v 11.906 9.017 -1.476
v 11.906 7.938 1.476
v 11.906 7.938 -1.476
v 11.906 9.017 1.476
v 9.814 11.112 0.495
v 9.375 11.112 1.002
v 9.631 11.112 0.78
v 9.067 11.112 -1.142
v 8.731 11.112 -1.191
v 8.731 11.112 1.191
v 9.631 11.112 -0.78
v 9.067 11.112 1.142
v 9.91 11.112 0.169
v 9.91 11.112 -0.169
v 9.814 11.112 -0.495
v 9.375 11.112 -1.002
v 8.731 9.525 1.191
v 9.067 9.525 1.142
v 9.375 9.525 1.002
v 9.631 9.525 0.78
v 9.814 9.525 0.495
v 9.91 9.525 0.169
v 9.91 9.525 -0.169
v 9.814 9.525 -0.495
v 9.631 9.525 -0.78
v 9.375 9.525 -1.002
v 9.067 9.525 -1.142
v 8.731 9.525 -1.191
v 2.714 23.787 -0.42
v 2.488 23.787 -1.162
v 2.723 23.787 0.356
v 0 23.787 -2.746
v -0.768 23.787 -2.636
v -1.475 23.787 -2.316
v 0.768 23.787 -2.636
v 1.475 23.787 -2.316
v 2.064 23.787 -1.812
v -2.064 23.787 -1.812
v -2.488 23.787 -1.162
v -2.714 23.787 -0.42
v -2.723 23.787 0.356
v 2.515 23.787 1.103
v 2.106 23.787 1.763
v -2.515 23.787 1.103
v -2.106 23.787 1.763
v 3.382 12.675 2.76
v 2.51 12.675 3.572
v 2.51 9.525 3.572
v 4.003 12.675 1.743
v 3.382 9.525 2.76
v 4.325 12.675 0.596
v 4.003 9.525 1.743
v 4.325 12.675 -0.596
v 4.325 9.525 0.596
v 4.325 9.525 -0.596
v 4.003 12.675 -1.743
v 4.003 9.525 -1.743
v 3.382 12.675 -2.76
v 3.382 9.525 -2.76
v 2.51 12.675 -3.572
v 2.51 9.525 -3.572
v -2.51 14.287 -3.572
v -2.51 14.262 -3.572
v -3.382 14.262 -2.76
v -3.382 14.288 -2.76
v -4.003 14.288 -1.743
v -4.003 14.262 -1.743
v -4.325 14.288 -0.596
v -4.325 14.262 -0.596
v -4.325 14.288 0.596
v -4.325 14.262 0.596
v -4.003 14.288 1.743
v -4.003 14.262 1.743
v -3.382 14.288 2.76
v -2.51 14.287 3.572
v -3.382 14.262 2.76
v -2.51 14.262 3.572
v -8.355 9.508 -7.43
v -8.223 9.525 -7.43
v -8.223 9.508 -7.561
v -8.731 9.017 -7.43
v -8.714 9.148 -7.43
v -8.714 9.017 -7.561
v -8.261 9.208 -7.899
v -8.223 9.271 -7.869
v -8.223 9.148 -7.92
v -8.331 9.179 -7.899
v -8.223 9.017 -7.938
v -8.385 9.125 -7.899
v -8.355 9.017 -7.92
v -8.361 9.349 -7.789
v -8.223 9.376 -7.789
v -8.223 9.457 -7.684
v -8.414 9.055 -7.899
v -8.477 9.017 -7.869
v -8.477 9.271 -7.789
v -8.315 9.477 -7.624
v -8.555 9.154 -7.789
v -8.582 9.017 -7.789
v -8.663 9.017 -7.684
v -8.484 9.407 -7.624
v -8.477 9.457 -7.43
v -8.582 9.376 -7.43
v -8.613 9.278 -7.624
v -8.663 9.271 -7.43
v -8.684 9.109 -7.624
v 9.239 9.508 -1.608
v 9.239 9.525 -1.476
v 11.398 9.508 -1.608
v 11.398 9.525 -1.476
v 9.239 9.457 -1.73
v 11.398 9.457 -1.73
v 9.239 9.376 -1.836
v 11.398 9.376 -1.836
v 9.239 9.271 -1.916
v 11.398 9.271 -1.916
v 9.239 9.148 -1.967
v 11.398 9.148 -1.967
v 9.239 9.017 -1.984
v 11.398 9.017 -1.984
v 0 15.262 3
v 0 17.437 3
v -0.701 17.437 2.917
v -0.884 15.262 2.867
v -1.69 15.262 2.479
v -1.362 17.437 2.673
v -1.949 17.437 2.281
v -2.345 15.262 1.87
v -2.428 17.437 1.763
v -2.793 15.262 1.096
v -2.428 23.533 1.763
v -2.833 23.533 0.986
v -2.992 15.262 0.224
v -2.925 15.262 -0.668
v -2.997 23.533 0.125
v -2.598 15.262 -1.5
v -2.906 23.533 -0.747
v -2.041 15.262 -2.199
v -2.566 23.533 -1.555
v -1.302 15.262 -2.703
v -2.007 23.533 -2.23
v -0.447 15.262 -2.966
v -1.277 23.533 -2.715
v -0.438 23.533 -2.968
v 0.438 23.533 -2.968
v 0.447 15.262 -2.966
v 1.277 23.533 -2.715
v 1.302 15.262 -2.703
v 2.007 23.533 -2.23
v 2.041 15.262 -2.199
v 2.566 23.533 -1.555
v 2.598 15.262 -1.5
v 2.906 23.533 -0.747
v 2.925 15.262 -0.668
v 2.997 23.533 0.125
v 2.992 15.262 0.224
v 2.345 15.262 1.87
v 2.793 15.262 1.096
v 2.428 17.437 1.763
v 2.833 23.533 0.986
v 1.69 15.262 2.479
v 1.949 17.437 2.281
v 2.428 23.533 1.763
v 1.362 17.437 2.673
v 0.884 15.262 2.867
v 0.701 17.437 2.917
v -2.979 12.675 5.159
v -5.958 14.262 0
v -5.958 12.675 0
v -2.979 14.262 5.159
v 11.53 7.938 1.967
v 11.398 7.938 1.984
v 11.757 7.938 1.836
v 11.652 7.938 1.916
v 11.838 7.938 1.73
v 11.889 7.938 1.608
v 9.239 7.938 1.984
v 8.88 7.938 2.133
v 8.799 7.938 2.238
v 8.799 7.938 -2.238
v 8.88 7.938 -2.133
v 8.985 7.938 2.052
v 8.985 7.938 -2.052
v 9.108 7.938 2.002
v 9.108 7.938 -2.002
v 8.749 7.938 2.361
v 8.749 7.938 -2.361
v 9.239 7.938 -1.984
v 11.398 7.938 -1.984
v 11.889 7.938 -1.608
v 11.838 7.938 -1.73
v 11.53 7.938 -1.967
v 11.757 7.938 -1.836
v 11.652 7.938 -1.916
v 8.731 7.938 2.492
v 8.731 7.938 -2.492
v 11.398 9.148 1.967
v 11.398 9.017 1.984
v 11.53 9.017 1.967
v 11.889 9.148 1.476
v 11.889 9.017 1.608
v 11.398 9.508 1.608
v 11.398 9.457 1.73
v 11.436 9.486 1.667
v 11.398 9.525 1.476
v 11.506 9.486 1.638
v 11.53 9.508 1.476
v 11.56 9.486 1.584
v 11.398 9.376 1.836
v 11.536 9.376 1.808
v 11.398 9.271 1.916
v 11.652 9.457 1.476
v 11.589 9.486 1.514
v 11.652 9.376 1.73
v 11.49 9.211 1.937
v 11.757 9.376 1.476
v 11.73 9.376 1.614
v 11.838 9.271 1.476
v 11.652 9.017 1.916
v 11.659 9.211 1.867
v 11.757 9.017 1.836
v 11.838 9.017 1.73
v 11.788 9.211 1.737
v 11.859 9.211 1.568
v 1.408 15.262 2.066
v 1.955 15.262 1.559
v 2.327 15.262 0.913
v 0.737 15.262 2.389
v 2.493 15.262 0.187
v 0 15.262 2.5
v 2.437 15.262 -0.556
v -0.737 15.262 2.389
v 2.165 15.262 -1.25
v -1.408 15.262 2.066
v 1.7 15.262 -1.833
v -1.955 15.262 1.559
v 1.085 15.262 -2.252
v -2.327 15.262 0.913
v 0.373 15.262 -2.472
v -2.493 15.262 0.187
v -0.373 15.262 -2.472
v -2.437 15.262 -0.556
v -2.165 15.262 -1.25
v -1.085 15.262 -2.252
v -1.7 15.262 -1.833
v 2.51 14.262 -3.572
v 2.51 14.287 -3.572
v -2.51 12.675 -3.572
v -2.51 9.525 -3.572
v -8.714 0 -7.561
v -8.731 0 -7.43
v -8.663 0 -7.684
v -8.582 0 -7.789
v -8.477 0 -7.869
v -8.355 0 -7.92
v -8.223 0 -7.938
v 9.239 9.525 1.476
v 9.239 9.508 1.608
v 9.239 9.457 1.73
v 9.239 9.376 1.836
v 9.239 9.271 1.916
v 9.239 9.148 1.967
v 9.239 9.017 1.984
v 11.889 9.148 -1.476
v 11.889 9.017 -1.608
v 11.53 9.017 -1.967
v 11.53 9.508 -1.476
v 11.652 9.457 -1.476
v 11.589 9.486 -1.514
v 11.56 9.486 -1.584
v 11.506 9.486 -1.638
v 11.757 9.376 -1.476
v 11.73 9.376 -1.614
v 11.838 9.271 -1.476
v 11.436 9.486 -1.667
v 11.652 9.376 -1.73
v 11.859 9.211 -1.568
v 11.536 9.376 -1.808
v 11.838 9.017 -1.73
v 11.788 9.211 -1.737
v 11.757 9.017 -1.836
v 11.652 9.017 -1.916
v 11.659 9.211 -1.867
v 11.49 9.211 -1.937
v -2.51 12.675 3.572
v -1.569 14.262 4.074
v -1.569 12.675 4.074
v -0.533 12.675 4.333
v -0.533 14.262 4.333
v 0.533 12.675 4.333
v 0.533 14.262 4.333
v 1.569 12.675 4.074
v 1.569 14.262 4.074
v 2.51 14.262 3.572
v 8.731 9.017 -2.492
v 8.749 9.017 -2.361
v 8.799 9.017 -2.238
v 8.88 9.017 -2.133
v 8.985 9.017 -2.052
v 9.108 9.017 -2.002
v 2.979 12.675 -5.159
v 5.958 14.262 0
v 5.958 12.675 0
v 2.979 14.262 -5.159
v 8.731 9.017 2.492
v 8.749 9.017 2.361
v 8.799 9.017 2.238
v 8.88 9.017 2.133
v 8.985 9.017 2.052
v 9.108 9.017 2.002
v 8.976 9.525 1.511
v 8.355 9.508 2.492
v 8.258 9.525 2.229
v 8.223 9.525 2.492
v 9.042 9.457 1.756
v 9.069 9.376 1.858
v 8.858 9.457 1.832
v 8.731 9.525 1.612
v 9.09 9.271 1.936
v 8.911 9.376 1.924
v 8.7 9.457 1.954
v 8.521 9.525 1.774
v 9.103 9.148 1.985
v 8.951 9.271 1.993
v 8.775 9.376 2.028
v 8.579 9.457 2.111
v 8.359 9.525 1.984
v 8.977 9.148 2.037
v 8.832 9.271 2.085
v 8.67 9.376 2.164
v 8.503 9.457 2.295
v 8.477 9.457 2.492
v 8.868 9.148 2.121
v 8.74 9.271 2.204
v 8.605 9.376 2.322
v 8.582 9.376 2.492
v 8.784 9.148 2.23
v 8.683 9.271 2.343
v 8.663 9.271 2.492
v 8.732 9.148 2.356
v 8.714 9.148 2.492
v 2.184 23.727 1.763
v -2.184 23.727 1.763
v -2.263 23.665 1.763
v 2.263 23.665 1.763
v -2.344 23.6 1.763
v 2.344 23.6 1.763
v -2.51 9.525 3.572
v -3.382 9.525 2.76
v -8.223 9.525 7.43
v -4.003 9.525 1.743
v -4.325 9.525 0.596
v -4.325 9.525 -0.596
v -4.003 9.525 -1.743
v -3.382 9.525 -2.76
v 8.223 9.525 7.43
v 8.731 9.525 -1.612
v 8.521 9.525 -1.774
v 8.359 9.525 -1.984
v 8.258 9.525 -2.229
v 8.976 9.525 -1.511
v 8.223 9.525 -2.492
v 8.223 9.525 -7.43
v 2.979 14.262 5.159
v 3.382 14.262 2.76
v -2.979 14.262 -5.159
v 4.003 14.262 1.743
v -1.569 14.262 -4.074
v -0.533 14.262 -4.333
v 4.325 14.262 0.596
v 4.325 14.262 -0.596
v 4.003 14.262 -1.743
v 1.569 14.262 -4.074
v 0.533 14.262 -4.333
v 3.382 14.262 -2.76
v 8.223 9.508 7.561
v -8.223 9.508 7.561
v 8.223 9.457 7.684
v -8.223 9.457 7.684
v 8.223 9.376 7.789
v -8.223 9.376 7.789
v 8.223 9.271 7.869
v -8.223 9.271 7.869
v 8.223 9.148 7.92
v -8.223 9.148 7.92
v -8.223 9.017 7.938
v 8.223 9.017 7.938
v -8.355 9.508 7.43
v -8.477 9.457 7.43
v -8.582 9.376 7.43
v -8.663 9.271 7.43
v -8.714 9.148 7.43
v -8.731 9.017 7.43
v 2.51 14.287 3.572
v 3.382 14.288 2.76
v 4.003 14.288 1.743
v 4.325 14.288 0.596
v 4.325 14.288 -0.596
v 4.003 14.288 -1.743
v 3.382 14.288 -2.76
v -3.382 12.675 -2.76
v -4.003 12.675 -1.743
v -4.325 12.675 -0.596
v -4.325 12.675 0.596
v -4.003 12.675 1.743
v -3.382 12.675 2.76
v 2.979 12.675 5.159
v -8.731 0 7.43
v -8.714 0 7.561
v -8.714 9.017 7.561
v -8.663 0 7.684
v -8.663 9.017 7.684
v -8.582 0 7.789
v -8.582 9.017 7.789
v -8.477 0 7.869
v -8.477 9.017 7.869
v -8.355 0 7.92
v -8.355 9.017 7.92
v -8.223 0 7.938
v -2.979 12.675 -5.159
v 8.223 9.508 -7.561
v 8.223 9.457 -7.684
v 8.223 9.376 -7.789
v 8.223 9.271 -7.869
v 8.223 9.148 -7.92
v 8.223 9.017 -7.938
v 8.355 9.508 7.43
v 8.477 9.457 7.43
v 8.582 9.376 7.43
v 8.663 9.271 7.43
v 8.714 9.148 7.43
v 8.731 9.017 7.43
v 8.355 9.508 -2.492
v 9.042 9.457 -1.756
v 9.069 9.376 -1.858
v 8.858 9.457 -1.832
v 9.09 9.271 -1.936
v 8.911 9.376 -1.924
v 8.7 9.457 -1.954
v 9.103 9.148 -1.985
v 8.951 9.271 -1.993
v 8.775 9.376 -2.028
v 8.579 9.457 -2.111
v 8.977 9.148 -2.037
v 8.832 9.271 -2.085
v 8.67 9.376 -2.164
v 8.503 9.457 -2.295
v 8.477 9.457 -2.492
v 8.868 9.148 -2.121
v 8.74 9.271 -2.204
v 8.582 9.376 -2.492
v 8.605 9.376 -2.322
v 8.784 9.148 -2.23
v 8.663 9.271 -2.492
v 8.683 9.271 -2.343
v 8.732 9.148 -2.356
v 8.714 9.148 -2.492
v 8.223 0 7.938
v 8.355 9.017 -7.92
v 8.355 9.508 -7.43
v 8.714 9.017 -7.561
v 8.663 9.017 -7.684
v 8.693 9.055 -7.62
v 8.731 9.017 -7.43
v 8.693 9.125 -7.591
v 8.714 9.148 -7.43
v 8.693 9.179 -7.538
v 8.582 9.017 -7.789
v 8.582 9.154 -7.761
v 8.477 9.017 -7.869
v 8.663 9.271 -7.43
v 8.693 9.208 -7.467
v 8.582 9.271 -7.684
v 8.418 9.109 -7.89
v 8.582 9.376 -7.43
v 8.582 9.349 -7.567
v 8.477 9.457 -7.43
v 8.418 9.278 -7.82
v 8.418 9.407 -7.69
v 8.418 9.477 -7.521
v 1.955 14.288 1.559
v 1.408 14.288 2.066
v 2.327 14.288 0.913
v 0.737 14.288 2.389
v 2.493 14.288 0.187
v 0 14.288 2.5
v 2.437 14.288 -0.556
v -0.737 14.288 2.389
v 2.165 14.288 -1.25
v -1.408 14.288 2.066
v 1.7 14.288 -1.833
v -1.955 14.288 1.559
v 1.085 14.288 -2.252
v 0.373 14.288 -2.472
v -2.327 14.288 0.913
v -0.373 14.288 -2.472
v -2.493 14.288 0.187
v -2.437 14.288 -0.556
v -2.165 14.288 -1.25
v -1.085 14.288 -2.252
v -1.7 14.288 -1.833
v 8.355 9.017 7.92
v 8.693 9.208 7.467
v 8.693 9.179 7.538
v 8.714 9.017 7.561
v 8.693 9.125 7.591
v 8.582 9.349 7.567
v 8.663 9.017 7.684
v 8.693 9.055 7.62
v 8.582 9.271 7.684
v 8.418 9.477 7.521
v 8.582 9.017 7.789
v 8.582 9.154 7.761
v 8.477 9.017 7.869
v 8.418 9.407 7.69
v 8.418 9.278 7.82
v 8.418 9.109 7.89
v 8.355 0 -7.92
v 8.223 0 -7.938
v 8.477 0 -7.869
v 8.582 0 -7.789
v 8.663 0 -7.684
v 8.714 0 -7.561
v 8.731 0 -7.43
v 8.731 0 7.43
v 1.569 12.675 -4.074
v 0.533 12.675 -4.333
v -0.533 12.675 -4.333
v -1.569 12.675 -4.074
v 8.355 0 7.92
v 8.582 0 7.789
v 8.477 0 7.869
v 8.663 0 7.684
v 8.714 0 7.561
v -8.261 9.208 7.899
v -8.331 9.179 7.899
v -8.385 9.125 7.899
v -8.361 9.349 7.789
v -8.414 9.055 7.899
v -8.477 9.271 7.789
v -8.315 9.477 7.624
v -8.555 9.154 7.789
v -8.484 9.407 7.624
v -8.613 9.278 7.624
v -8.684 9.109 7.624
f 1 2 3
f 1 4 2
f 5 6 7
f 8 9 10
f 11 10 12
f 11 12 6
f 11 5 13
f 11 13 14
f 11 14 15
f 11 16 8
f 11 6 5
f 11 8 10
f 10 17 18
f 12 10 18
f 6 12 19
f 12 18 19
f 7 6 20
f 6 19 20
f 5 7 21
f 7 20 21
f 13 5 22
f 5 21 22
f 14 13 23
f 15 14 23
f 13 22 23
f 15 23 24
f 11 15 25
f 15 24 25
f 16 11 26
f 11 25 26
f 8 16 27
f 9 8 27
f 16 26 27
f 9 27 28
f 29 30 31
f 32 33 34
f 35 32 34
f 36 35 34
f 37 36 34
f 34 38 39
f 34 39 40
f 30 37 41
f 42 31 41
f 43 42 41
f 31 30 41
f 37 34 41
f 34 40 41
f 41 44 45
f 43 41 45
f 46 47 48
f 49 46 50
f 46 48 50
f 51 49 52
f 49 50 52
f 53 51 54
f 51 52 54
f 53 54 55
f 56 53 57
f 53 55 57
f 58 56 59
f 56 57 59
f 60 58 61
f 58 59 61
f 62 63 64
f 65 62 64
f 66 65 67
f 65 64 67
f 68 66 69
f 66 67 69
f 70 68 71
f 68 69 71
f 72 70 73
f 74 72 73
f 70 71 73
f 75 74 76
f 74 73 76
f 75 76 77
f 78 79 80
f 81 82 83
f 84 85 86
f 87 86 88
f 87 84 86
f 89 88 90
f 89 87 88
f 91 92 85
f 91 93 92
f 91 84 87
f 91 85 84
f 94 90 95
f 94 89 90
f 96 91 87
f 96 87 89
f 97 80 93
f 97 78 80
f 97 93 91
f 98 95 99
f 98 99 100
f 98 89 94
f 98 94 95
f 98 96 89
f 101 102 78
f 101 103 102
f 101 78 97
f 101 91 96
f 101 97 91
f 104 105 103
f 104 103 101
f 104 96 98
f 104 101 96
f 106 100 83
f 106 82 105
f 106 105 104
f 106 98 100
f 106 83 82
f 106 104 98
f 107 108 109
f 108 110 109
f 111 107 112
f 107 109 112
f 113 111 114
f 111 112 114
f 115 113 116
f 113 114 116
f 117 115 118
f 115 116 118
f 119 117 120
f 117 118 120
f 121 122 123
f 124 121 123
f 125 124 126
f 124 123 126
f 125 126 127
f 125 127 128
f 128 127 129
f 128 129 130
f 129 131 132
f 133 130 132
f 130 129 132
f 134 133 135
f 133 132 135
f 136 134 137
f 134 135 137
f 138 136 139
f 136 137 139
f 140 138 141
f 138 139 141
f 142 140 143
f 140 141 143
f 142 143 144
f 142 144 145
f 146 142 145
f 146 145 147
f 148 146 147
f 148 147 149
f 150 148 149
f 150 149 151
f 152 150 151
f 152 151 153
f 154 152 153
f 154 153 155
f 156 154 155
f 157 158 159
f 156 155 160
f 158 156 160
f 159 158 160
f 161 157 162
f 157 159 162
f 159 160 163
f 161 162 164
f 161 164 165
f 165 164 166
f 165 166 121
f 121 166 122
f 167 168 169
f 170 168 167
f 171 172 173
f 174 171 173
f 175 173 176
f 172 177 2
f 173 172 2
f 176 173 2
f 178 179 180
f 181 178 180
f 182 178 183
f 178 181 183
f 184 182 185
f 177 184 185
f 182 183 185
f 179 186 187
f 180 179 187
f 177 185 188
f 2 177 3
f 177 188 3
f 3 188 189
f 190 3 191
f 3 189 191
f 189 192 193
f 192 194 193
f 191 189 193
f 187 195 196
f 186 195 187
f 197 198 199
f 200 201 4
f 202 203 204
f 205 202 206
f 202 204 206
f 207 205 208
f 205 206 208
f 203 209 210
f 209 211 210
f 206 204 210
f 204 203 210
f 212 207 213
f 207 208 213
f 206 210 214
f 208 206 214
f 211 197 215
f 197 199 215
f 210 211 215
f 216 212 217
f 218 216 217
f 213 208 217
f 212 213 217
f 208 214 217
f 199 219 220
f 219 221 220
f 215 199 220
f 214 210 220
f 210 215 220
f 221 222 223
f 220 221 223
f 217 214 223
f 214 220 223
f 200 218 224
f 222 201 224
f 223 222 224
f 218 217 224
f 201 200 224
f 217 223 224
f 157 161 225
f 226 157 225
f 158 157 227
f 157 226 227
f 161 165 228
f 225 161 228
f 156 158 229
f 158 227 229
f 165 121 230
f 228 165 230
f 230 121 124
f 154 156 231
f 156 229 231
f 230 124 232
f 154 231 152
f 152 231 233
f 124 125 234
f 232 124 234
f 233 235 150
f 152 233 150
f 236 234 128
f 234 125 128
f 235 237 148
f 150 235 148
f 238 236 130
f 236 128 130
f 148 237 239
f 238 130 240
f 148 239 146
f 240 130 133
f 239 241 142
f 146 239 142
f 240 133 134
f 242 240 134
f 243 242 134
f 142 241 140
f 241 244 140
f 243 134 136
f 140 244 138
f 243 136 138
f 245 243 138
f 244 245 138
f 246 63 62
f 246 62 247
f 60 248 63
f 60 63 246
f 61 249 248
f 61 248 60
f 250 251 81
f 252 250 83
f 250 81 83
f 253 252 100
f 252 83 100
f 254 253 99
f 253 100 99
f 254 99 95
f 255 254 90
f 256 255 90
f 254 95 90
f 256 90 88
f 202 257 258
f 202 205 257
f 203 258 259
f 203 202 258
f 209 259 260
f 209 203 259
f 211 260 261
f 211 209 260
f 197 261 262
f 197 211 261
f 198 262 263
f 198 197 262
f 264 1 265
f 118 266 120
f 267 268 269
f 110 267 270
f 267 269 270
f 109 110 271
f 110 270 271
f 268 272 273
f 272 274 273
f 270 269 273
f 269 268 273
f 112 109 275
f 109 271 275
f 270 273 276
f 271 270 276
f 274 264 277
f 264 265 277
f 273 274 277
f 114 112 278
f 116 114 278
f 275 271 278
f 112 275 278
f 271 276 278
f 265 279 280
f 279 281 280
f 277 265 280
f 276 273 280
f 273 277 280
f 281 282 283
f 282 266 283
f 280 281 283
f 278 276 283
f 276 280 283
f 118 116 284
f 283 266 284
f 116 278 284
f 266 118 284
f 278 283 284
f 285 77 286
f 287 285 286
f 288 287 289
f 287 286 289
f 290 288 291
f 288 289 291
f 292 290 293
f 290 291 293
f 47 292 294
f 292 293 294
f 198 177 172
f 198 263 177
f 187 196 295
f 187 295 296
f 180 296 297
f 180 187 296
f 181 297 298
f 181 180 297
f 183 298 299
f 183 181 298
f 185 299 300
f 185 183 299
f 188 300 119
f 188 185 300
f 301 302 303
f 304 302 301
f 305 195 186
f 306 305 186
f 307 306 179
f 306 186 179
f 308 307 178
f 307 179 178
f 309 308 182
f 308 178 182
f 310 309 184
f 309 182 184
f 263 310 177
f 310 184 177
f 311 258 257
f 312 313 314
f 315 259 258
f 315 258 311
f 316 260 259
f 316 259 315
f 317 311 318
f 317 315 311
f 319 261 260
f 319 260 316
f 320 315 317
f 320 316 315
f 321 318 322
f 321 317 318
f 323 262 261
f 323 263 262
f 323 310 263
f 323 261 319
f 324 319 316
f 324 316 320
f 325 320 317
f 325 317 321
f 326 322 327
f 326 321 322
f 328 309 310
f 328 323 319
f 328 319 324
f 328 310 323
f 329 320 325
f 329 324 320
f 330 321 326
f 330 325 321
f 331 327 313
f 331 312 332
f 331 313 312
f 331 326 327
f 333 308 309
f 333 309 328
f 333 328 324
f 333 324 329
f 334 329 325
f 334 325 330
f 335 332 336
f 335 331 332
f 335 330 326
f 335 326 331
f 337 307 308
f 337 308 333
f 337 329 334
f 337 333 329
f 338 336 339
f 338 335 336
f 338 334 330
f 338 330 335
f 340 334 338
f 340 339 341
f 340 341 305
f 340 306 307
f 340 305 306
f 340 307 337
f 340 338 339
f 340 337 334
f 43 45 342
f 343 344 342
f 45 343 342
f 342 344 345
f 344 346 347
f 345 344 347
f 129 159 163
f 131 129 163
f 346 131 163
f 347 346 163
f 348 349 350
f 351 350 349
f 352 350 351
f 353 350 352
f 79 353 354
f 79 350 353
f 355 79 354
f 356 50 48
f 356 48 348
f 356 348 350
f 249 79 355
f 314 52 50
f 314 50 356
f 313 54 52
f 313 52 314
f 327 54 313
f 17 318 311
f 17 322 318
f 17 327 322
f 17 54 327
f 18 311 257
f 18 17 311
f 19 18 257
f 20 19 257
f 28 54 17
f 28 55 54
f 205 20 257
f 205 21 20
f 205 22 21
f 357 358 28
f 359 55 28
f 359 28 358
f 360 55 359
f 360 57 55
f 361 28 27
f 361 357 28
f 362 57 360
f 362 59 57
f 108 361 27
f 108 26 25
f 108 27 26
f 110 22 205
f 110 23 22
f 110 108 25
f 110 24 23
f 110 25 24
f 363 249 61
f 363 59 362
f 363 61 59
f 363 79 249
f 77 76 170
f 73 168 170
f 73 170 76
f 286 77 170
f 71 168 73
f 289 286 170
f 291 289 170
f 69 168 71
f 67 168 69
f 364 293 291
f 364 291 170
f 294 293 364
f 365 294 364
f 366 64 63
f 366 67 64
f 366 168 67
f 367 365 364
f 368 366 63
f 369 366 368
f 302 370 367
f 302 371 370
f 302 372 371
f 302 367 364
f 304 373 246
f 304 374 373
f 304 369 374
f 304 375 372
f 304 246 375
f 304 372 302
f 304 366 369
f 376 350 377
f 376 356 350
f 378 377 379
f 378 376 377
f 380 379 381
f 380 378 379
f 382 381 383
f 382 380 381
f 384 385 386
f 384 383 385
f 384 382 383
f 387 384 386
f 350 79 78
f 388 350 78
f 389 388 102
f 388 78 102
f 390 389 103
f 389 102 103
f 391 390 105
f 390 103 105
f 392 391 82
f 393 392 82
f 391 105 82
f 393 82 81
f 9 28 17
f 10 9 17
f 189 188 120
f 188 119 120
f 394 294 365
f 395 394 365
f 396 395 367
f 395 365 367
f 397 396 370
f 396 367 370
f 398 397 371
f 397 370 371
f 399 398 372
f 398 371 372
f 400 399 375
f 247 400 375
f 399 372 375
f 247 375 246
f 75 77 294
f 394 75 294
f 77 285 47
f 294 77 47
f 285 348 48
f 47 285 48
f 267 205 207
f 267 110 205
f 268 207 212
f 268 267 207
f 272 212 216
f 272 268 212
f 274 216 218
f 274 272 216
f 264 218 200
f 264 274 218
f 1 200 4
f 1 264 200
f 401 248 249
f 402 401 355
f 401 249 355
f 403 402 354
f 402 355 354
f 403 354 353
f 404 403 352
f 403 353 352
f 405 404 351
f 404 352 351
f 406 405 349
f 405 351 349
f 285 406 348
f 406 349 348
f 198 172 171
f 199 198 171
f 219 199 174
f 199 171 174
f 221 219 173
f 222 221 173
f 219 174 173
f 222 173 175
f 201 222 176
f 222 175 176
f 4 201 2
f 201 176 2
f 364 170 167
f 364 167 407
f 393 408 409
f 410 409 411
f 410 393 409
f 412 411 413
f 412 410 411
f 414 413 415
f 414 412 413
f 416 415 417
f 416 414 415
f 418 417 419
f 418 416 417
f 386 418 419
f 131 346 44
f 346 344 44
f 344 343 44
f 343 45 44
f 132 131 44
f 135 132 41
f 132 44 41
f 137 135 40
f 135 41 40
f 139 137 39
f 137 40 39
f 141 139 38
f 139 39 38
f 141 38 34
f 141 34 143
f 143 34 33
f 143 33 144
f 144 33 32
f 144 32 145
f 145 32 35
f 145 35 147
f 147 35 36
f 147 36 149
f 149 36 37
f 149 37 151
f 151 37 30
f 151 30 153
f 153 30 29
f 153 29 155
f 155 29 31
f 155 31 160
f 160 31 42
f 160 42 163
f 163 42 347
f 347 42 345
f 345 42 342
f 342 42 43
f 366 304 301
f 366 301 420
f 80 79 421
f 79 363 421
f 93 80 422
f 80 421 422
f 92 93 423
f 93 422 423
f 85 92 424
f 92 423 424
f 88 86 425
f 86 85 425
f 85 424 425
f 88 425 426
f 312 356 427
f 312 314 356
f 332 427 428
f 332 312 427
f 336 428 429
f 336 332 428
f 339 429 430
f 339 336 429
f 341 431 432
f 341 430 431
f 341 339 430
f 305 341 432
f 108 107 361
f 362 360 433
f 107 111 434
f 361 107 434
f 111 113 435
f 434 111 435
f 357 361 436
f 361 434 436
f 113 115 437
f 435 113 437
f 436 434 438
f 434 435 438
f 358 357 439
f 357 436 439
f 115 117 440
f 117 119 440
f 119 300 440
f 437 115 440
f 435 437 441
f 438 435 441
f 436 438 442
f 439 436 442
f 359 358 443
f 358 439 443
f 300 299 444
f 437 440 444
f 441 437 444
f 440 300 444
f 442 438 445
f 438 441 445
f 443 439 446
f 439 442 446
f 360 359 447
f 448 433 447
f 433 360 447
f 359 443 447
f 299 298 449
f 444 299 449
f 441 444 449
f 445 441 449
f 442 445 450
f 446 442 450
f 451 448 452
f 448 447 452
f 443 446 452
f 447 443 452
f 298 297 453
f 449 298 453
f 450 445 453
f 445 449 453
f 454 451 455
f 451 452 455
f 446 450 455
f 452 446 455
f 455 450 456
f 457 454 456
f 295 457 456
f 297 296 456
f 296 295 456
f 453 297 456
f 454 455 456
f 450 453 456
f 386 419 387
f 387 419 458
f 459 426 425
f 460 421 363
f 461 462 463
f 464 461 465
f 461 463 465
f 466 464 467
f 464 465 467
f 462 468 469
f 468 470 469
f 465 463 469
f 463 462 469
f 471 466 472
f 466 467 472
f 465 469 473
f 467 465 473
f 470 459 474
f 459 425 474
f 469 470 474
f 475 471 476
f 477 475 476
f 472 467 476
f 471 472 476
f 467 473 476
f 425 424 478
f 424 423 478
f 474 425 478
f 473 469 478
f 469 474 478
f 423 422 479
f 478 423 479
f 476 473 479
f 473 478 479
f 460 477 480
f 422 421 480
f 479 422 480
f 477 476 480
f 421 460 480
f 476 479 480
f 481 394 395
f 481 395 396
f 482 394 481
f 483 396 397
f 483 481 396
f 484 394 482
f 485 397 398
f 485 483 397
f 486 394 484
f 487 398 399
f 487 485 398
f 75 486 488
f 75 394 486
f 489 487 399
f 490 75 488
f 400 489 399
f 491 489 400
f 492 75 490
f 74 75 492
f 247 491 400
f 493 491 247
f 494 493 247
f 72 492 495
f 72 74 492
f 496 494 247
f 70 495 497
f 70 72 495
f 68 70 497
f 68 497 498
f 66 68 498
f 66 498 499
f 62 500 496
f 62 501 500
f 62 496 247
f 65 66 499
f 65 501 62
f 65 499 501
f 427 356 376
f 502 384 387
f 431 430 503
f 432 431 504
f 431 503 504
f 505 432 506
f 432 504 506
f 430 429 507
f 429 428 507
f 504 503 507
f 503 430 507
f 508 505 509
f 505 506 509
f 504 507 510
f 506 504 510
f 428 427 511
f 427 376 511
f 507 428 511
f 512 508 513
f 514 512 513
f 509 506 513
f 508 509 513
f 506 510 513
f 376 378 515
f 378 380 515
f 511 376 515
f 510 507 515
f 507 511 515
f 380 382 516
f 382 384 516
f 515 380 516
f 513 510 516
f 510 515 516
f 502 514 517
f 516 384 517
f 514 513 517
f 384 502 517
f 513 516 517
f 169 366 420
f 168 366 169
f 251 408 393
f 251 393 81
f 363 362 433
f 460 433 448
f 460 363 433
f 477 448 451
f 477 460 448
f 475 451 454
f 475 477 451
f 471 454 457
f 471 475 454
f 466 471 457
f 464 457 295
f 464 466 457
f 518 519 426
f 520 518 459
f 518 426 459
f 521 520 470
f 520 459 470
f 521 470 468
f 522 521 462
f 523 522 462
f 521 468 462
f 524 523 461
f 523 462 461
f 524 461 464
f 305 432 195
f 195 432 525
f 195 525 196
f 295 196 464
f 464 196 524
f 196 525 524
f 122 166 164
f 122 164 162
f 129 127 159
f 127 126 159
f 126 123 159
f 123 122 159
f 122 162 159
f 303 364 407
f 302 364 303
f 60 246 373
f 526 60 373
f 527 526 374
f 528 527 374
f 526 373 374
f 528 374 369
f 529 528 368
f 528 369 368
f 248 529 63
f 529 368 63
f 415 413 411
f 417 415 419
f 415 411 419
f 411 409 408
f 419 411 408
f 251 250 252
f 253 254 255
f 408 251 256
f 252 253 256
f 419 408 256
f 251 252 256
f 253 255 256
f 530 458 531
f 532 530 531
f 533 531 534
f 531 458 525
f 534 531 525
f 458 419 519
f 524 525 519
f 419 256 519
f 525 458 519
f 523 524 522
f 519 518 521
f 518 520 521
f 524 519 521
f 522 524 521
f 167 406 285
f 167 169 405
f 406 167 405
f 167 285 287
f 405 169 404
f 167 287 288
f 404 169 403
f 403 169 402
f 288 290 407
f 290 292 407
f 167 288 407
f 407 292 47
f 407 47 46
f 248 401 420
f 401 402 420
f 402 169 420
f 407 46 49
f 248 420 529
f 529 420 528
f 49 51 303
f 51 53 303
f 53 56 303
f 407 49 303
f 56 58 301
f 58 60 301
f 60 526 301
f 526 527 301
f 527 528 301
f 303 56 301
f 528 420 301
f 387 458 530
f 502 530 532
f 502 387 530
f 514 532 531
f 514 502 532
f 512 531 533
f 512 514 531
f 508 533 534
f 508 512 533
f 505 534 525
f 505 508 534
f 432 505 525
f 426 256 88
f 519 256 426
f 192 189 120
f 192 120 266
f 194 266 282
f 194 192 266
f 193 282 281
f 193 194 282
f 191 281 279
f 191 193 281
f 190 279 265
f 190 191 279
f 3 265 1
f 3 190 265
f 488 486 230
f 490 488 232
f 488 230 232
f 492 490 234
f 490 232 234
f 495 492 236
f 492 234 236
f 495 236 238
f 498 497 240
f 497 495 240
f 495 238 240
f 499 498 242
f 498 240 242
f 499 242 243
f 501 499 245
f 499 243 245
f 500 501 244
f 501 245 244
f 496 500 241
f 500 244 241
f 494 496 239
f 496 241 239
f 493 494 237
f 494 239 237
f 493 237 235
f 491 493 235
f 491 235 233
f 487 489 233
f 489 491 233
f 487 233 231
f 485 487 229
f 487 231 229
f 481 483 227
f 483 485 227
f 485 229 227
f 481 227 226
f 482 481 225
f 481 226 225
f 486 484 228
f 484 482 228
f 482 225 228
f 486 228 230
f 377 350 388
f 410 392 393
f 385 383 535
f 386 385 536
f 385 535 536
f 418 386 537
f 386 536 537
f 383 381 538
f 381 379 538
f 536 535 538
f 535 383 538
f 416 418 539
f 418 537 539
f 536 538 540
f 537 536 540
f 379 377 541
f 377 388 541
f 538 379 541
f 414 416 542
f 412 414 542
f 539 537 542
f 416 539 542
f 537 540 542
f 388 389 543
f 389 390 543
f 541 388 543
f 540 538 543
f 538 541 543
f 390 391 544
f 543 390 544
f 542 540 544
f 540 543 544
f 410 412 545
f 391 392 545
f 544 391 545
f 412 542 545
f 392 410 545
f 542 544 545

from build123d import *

# Parameters (mm, degrees)
SKETCH1_W                           = 17.4625
SKETCH1_H                           = 15.875
BOSS_EXTRUDE1_DEPTH                 = 9.525
SKETCH2_R                           = 4.365625
BOSS_EXTRUDE2_DEPTH                 = 4.7625
CUT_EXTRUDE1_START                  = -4.7625
CUT_EXTRUDE1_DEPTH                  = 4.7625
BOSS_EXTRUDE3_START                 = -0.0254
SKETCH4_R                           = 4.365625
BOSS_EXTRUDE3_DEPTH                 = 1.5875
CUT_EXTRUDE2_REACH                  = 28.553
CUT_EXTRUDE2_END_RADIUS             = 3
SKETCH6_W                           = 1.2375
SKETCH6_H                           = 6.35
CUT_EXTRUDE2_DIRECTION_2_REACH      = 28.553
CUT_EXTRUDE2_DIRECTION_2_END_RADIUS = 3
CHAMFER1_SIZE                       = 0.254
SKETCH7_W                           = 3.175
SKETCH7_H                           = 3.96875
BOSS_EXTRUDE4_DEPTH                 = 1.5875
BOSS_EXTRUDE5_DEPTH                 = 1.5875
FILLET1_R                           = 0.508


with BuildPart() as part:
    # Sketch1 → Boss-Extrude1 (new body)
    with BuildSketch(Plane(origin=(0, 0, 0), x_dir=(1, 0, 0), z_dir=(0, 1, 0))):
        Rectangle(SKETCH1_W, SKETCH1_H)
    extrude(amount=BOSS_EXTRUDE1_DEPTH)

    # Sketch2 → Boss-Extrude2 (add)
    with BuildSketch(Plane(origin=(0, 9.525, 0), x_dir=(1, 0, 0), z_dir=(0, 1, 0))):
        with Locations(Location((0, 0, 0), (0, 0, 90))):
            Circle(SKETCH2_R)
    extrude(amount=BOSS_EXTRUDE2_DEPTH)

    # Sketch3 → Cut-Extrude1 (cut)
    with BuildSketch(Plane(origin=(0, 14.2875, 0), x_dir=(1, 0, 0), z_dir=(0, 1, 0)).offset(CUT_EXTRUDE1_START)):
        with BuildLine():
            Line((-2.510057893, -3.571875), (2.510057893, -3.571875))
            ThreePointArc((2.510057893, -3.571875), (0, -4.365625), (-2.510057893, -3.571875))
        make_face()
        with BuildLine():
            Line((-2.510057893, 3.571875), (2.510057893, 3.571875))
            ThreePointArc((2.510057893, 3.571875), (0, 4.365625), (-2.510057893, 3.571875))
        make_face()
    extrude(amount=CUT_EXTRUDE1_DEPTH, mode=Mode.SUBTRACT)



with BuildPart() as body_2:
    # Sketch4 → Boss-Extrude3 (new body)
    with BuildSketch(Plane(origin=(0, 14.2875, 0), x_dir=(1, 0, 0), z_dir=(0, 1, 0)).offset(BOSS_EXTRUDE3_START)):
        Polygon((2.978766545, 5.159375), (-2.978766545, 5.159375), (-5.95753309, 0), (-2.978766545, -5.159375), (2.978766545, -5.159375), (5.95753309, 0), align=None)
        with Locations(Location((0, 0, 0), (0, 0, 270))):
            Circle(SKETCH4_R, mode=Mode.SUBTRACT)
    extrude(amount=-BOSS_EXTRUDE3_DEPTH)


with BuildPart() as part_1:
    add(part.part)

    add(body_2.part)  # Revolve1 merges body 2
    # Sketch5 → Revolve1 (revolve)
    with BuildSketch(Plane(origin=(0, 0, 0), x_dir=(0, 0, -1), z_dir=(1, 0, 0))):
        Polygon((-2.5, 14.2621), (-2.5, 15.2621), (-3, 15.2621), (-3, 23.7871), (0, 23.7871), (0, 14.2621), align=None)
    revolve(axis=Axis((0, 14.2621, 0), (0, -1, 0)))

    # Cut-Extrude2: up to this cylinder (the profile starts inside it)
    cut_extrude2_end = Plane(origin=(0, 20.6121, 0), z_dir=(0, 1, 0)) * Cylinder(CUT_EXTRUDE2_END_RADIUS, 64.106, mode=Mode.PRIVATE)
    # Sketch6 → Cut-Extrude2 (cut, up to the surface)
    with BuildSketch(Plane(origin=(0, 0, 0), x_dir=(0, 0, -1), z_dir=(1, 0, 0)), mode=Mode.PRIVATE) as cut_extrude2_sk1:
        with Locations((-2.38125, 20.6121)):
            Rectangle(SKETCH6_W, SKETCH6_H)
    cut_extrude2_tool1 = extrude(cut_extrude2_sk1.sketch, amount=-CUT_EXTRUDE2_REACH, mode=Mode.PRIVATE) & cut_extrude2_end
    add(cut_extrude2_tool1.solids().sort_by_distance((0, 20.6121, 2.38125))[0], mode=Mode.SUBTRACT)

    # Cut-Extrude2 direction 2: up to this cylinder (the profile starts inside it)
    cut_extrude2_direction_2_end = Plane(origin=(0, 20.6121, 0), z_dir=(0, 1, 0)) * Cylinder(CUT_EXTRUDE2_DIRECTION_2_END_RADIUS, 64.106, mode=Mode.PRIVATE)
    # Sketch6 → Cut-Extrude2 direction 2 (cut, up to the surface)
    with BuildSketch(Plane(origin=(0, 0, 0), x_dir=(0, 0, -1), z_dir=(1, 0, 0)), mode=Mode.PRIVATE) as cut_extrude2_direction_2_sk1:
        with Locations((-2.38125, 20.6121)):
            Rectangle(SKETCH6_W, SKETCH6_H)
    cut_extrude2_direction_2_tool1 = extrude(cut_extrude2_direction_2_sk1.sketch, amount=CUT_EXTRUDE2_DIRECTION_2_REACH, mode=Mode.PRIVATE) & cut_extrude2_direction_2_end
    add(cut_extrude2_direction_2_tool1.solids().sort_by_distance((0, 20.6121, 2.38125))[0], mode=Mode.SUBTRACT)

    # Chamfer1
    chamfer1_edges = [part_1.edges().sort_by_distance(p)[0] for p in [
        (0, 23.7871, -3),
    ]]
    chamfer(chamfer1_edges, length=CHAMFER1_SIZE)

    # Sketch7 → Boss-Extrude4 (add)
    with BuildSketch(Plane(origin=(0, 9.525, 0), x_dir=(1, 0, 0), z_dir=(0, 1, 0))):
        with Locations((10.31875, 0)):
            Rectangle(SKETCH7_W, SKETCH7_H)
    extrude(amount=-BOSS_EXTRUDE4_DEPTH)

    # Sketch8 → Boss-Extrude5 (add)
    with BuildSketch(Plane(origin=(0, 9.525, 0), x_dir=(1, 0, 0), z_dir=(0, 1, 0))):
        with BuildLine():
            Line((8.73125, 1.190625), (8.73125, -1.190625))
            ThreePointArc((8.73125, -1.190625), (9.921875, 0), (8.73125, 1.190625))
        make_face()
    extrude(amount=BOSS_EXTRUDE5_DEPTH)

    # Fillet1
    fillet1_edges = [part_1.edges().sort_by_distance(p)[0] for p in [
        (-8.73125, 9.525, 0),
        (0, 9.525, 7.9375),
        (8.73125, 9.525, 4.9609375),
        (0, 9.525, -7.9375),
        (8.73125, 4.7625, 7.9375),
        (-8.73125, 4.7625, 7.9375),
        (-8.73125, 4.7625, -7.9375),
        (8.73125, 4.7625, -7.9375),
        (8.73125, 9.525, -4.9609375),
        (8.73125, 8.73125, 1.984375),
        (8.73125, 8.73125, -1.984375),
        (11.90625, 8.73125, -1.984375),
        (11.90625, 8.73125, 1.984375),
        (10.31875, 9.525, 1.984375),
        (11.90625, 9.525, 0),
        (10.31875, 9.525, -1.984375),
    ]]
    fillet(fillet1_edges, radius=FILLET1_R)


solid = part_1.part
